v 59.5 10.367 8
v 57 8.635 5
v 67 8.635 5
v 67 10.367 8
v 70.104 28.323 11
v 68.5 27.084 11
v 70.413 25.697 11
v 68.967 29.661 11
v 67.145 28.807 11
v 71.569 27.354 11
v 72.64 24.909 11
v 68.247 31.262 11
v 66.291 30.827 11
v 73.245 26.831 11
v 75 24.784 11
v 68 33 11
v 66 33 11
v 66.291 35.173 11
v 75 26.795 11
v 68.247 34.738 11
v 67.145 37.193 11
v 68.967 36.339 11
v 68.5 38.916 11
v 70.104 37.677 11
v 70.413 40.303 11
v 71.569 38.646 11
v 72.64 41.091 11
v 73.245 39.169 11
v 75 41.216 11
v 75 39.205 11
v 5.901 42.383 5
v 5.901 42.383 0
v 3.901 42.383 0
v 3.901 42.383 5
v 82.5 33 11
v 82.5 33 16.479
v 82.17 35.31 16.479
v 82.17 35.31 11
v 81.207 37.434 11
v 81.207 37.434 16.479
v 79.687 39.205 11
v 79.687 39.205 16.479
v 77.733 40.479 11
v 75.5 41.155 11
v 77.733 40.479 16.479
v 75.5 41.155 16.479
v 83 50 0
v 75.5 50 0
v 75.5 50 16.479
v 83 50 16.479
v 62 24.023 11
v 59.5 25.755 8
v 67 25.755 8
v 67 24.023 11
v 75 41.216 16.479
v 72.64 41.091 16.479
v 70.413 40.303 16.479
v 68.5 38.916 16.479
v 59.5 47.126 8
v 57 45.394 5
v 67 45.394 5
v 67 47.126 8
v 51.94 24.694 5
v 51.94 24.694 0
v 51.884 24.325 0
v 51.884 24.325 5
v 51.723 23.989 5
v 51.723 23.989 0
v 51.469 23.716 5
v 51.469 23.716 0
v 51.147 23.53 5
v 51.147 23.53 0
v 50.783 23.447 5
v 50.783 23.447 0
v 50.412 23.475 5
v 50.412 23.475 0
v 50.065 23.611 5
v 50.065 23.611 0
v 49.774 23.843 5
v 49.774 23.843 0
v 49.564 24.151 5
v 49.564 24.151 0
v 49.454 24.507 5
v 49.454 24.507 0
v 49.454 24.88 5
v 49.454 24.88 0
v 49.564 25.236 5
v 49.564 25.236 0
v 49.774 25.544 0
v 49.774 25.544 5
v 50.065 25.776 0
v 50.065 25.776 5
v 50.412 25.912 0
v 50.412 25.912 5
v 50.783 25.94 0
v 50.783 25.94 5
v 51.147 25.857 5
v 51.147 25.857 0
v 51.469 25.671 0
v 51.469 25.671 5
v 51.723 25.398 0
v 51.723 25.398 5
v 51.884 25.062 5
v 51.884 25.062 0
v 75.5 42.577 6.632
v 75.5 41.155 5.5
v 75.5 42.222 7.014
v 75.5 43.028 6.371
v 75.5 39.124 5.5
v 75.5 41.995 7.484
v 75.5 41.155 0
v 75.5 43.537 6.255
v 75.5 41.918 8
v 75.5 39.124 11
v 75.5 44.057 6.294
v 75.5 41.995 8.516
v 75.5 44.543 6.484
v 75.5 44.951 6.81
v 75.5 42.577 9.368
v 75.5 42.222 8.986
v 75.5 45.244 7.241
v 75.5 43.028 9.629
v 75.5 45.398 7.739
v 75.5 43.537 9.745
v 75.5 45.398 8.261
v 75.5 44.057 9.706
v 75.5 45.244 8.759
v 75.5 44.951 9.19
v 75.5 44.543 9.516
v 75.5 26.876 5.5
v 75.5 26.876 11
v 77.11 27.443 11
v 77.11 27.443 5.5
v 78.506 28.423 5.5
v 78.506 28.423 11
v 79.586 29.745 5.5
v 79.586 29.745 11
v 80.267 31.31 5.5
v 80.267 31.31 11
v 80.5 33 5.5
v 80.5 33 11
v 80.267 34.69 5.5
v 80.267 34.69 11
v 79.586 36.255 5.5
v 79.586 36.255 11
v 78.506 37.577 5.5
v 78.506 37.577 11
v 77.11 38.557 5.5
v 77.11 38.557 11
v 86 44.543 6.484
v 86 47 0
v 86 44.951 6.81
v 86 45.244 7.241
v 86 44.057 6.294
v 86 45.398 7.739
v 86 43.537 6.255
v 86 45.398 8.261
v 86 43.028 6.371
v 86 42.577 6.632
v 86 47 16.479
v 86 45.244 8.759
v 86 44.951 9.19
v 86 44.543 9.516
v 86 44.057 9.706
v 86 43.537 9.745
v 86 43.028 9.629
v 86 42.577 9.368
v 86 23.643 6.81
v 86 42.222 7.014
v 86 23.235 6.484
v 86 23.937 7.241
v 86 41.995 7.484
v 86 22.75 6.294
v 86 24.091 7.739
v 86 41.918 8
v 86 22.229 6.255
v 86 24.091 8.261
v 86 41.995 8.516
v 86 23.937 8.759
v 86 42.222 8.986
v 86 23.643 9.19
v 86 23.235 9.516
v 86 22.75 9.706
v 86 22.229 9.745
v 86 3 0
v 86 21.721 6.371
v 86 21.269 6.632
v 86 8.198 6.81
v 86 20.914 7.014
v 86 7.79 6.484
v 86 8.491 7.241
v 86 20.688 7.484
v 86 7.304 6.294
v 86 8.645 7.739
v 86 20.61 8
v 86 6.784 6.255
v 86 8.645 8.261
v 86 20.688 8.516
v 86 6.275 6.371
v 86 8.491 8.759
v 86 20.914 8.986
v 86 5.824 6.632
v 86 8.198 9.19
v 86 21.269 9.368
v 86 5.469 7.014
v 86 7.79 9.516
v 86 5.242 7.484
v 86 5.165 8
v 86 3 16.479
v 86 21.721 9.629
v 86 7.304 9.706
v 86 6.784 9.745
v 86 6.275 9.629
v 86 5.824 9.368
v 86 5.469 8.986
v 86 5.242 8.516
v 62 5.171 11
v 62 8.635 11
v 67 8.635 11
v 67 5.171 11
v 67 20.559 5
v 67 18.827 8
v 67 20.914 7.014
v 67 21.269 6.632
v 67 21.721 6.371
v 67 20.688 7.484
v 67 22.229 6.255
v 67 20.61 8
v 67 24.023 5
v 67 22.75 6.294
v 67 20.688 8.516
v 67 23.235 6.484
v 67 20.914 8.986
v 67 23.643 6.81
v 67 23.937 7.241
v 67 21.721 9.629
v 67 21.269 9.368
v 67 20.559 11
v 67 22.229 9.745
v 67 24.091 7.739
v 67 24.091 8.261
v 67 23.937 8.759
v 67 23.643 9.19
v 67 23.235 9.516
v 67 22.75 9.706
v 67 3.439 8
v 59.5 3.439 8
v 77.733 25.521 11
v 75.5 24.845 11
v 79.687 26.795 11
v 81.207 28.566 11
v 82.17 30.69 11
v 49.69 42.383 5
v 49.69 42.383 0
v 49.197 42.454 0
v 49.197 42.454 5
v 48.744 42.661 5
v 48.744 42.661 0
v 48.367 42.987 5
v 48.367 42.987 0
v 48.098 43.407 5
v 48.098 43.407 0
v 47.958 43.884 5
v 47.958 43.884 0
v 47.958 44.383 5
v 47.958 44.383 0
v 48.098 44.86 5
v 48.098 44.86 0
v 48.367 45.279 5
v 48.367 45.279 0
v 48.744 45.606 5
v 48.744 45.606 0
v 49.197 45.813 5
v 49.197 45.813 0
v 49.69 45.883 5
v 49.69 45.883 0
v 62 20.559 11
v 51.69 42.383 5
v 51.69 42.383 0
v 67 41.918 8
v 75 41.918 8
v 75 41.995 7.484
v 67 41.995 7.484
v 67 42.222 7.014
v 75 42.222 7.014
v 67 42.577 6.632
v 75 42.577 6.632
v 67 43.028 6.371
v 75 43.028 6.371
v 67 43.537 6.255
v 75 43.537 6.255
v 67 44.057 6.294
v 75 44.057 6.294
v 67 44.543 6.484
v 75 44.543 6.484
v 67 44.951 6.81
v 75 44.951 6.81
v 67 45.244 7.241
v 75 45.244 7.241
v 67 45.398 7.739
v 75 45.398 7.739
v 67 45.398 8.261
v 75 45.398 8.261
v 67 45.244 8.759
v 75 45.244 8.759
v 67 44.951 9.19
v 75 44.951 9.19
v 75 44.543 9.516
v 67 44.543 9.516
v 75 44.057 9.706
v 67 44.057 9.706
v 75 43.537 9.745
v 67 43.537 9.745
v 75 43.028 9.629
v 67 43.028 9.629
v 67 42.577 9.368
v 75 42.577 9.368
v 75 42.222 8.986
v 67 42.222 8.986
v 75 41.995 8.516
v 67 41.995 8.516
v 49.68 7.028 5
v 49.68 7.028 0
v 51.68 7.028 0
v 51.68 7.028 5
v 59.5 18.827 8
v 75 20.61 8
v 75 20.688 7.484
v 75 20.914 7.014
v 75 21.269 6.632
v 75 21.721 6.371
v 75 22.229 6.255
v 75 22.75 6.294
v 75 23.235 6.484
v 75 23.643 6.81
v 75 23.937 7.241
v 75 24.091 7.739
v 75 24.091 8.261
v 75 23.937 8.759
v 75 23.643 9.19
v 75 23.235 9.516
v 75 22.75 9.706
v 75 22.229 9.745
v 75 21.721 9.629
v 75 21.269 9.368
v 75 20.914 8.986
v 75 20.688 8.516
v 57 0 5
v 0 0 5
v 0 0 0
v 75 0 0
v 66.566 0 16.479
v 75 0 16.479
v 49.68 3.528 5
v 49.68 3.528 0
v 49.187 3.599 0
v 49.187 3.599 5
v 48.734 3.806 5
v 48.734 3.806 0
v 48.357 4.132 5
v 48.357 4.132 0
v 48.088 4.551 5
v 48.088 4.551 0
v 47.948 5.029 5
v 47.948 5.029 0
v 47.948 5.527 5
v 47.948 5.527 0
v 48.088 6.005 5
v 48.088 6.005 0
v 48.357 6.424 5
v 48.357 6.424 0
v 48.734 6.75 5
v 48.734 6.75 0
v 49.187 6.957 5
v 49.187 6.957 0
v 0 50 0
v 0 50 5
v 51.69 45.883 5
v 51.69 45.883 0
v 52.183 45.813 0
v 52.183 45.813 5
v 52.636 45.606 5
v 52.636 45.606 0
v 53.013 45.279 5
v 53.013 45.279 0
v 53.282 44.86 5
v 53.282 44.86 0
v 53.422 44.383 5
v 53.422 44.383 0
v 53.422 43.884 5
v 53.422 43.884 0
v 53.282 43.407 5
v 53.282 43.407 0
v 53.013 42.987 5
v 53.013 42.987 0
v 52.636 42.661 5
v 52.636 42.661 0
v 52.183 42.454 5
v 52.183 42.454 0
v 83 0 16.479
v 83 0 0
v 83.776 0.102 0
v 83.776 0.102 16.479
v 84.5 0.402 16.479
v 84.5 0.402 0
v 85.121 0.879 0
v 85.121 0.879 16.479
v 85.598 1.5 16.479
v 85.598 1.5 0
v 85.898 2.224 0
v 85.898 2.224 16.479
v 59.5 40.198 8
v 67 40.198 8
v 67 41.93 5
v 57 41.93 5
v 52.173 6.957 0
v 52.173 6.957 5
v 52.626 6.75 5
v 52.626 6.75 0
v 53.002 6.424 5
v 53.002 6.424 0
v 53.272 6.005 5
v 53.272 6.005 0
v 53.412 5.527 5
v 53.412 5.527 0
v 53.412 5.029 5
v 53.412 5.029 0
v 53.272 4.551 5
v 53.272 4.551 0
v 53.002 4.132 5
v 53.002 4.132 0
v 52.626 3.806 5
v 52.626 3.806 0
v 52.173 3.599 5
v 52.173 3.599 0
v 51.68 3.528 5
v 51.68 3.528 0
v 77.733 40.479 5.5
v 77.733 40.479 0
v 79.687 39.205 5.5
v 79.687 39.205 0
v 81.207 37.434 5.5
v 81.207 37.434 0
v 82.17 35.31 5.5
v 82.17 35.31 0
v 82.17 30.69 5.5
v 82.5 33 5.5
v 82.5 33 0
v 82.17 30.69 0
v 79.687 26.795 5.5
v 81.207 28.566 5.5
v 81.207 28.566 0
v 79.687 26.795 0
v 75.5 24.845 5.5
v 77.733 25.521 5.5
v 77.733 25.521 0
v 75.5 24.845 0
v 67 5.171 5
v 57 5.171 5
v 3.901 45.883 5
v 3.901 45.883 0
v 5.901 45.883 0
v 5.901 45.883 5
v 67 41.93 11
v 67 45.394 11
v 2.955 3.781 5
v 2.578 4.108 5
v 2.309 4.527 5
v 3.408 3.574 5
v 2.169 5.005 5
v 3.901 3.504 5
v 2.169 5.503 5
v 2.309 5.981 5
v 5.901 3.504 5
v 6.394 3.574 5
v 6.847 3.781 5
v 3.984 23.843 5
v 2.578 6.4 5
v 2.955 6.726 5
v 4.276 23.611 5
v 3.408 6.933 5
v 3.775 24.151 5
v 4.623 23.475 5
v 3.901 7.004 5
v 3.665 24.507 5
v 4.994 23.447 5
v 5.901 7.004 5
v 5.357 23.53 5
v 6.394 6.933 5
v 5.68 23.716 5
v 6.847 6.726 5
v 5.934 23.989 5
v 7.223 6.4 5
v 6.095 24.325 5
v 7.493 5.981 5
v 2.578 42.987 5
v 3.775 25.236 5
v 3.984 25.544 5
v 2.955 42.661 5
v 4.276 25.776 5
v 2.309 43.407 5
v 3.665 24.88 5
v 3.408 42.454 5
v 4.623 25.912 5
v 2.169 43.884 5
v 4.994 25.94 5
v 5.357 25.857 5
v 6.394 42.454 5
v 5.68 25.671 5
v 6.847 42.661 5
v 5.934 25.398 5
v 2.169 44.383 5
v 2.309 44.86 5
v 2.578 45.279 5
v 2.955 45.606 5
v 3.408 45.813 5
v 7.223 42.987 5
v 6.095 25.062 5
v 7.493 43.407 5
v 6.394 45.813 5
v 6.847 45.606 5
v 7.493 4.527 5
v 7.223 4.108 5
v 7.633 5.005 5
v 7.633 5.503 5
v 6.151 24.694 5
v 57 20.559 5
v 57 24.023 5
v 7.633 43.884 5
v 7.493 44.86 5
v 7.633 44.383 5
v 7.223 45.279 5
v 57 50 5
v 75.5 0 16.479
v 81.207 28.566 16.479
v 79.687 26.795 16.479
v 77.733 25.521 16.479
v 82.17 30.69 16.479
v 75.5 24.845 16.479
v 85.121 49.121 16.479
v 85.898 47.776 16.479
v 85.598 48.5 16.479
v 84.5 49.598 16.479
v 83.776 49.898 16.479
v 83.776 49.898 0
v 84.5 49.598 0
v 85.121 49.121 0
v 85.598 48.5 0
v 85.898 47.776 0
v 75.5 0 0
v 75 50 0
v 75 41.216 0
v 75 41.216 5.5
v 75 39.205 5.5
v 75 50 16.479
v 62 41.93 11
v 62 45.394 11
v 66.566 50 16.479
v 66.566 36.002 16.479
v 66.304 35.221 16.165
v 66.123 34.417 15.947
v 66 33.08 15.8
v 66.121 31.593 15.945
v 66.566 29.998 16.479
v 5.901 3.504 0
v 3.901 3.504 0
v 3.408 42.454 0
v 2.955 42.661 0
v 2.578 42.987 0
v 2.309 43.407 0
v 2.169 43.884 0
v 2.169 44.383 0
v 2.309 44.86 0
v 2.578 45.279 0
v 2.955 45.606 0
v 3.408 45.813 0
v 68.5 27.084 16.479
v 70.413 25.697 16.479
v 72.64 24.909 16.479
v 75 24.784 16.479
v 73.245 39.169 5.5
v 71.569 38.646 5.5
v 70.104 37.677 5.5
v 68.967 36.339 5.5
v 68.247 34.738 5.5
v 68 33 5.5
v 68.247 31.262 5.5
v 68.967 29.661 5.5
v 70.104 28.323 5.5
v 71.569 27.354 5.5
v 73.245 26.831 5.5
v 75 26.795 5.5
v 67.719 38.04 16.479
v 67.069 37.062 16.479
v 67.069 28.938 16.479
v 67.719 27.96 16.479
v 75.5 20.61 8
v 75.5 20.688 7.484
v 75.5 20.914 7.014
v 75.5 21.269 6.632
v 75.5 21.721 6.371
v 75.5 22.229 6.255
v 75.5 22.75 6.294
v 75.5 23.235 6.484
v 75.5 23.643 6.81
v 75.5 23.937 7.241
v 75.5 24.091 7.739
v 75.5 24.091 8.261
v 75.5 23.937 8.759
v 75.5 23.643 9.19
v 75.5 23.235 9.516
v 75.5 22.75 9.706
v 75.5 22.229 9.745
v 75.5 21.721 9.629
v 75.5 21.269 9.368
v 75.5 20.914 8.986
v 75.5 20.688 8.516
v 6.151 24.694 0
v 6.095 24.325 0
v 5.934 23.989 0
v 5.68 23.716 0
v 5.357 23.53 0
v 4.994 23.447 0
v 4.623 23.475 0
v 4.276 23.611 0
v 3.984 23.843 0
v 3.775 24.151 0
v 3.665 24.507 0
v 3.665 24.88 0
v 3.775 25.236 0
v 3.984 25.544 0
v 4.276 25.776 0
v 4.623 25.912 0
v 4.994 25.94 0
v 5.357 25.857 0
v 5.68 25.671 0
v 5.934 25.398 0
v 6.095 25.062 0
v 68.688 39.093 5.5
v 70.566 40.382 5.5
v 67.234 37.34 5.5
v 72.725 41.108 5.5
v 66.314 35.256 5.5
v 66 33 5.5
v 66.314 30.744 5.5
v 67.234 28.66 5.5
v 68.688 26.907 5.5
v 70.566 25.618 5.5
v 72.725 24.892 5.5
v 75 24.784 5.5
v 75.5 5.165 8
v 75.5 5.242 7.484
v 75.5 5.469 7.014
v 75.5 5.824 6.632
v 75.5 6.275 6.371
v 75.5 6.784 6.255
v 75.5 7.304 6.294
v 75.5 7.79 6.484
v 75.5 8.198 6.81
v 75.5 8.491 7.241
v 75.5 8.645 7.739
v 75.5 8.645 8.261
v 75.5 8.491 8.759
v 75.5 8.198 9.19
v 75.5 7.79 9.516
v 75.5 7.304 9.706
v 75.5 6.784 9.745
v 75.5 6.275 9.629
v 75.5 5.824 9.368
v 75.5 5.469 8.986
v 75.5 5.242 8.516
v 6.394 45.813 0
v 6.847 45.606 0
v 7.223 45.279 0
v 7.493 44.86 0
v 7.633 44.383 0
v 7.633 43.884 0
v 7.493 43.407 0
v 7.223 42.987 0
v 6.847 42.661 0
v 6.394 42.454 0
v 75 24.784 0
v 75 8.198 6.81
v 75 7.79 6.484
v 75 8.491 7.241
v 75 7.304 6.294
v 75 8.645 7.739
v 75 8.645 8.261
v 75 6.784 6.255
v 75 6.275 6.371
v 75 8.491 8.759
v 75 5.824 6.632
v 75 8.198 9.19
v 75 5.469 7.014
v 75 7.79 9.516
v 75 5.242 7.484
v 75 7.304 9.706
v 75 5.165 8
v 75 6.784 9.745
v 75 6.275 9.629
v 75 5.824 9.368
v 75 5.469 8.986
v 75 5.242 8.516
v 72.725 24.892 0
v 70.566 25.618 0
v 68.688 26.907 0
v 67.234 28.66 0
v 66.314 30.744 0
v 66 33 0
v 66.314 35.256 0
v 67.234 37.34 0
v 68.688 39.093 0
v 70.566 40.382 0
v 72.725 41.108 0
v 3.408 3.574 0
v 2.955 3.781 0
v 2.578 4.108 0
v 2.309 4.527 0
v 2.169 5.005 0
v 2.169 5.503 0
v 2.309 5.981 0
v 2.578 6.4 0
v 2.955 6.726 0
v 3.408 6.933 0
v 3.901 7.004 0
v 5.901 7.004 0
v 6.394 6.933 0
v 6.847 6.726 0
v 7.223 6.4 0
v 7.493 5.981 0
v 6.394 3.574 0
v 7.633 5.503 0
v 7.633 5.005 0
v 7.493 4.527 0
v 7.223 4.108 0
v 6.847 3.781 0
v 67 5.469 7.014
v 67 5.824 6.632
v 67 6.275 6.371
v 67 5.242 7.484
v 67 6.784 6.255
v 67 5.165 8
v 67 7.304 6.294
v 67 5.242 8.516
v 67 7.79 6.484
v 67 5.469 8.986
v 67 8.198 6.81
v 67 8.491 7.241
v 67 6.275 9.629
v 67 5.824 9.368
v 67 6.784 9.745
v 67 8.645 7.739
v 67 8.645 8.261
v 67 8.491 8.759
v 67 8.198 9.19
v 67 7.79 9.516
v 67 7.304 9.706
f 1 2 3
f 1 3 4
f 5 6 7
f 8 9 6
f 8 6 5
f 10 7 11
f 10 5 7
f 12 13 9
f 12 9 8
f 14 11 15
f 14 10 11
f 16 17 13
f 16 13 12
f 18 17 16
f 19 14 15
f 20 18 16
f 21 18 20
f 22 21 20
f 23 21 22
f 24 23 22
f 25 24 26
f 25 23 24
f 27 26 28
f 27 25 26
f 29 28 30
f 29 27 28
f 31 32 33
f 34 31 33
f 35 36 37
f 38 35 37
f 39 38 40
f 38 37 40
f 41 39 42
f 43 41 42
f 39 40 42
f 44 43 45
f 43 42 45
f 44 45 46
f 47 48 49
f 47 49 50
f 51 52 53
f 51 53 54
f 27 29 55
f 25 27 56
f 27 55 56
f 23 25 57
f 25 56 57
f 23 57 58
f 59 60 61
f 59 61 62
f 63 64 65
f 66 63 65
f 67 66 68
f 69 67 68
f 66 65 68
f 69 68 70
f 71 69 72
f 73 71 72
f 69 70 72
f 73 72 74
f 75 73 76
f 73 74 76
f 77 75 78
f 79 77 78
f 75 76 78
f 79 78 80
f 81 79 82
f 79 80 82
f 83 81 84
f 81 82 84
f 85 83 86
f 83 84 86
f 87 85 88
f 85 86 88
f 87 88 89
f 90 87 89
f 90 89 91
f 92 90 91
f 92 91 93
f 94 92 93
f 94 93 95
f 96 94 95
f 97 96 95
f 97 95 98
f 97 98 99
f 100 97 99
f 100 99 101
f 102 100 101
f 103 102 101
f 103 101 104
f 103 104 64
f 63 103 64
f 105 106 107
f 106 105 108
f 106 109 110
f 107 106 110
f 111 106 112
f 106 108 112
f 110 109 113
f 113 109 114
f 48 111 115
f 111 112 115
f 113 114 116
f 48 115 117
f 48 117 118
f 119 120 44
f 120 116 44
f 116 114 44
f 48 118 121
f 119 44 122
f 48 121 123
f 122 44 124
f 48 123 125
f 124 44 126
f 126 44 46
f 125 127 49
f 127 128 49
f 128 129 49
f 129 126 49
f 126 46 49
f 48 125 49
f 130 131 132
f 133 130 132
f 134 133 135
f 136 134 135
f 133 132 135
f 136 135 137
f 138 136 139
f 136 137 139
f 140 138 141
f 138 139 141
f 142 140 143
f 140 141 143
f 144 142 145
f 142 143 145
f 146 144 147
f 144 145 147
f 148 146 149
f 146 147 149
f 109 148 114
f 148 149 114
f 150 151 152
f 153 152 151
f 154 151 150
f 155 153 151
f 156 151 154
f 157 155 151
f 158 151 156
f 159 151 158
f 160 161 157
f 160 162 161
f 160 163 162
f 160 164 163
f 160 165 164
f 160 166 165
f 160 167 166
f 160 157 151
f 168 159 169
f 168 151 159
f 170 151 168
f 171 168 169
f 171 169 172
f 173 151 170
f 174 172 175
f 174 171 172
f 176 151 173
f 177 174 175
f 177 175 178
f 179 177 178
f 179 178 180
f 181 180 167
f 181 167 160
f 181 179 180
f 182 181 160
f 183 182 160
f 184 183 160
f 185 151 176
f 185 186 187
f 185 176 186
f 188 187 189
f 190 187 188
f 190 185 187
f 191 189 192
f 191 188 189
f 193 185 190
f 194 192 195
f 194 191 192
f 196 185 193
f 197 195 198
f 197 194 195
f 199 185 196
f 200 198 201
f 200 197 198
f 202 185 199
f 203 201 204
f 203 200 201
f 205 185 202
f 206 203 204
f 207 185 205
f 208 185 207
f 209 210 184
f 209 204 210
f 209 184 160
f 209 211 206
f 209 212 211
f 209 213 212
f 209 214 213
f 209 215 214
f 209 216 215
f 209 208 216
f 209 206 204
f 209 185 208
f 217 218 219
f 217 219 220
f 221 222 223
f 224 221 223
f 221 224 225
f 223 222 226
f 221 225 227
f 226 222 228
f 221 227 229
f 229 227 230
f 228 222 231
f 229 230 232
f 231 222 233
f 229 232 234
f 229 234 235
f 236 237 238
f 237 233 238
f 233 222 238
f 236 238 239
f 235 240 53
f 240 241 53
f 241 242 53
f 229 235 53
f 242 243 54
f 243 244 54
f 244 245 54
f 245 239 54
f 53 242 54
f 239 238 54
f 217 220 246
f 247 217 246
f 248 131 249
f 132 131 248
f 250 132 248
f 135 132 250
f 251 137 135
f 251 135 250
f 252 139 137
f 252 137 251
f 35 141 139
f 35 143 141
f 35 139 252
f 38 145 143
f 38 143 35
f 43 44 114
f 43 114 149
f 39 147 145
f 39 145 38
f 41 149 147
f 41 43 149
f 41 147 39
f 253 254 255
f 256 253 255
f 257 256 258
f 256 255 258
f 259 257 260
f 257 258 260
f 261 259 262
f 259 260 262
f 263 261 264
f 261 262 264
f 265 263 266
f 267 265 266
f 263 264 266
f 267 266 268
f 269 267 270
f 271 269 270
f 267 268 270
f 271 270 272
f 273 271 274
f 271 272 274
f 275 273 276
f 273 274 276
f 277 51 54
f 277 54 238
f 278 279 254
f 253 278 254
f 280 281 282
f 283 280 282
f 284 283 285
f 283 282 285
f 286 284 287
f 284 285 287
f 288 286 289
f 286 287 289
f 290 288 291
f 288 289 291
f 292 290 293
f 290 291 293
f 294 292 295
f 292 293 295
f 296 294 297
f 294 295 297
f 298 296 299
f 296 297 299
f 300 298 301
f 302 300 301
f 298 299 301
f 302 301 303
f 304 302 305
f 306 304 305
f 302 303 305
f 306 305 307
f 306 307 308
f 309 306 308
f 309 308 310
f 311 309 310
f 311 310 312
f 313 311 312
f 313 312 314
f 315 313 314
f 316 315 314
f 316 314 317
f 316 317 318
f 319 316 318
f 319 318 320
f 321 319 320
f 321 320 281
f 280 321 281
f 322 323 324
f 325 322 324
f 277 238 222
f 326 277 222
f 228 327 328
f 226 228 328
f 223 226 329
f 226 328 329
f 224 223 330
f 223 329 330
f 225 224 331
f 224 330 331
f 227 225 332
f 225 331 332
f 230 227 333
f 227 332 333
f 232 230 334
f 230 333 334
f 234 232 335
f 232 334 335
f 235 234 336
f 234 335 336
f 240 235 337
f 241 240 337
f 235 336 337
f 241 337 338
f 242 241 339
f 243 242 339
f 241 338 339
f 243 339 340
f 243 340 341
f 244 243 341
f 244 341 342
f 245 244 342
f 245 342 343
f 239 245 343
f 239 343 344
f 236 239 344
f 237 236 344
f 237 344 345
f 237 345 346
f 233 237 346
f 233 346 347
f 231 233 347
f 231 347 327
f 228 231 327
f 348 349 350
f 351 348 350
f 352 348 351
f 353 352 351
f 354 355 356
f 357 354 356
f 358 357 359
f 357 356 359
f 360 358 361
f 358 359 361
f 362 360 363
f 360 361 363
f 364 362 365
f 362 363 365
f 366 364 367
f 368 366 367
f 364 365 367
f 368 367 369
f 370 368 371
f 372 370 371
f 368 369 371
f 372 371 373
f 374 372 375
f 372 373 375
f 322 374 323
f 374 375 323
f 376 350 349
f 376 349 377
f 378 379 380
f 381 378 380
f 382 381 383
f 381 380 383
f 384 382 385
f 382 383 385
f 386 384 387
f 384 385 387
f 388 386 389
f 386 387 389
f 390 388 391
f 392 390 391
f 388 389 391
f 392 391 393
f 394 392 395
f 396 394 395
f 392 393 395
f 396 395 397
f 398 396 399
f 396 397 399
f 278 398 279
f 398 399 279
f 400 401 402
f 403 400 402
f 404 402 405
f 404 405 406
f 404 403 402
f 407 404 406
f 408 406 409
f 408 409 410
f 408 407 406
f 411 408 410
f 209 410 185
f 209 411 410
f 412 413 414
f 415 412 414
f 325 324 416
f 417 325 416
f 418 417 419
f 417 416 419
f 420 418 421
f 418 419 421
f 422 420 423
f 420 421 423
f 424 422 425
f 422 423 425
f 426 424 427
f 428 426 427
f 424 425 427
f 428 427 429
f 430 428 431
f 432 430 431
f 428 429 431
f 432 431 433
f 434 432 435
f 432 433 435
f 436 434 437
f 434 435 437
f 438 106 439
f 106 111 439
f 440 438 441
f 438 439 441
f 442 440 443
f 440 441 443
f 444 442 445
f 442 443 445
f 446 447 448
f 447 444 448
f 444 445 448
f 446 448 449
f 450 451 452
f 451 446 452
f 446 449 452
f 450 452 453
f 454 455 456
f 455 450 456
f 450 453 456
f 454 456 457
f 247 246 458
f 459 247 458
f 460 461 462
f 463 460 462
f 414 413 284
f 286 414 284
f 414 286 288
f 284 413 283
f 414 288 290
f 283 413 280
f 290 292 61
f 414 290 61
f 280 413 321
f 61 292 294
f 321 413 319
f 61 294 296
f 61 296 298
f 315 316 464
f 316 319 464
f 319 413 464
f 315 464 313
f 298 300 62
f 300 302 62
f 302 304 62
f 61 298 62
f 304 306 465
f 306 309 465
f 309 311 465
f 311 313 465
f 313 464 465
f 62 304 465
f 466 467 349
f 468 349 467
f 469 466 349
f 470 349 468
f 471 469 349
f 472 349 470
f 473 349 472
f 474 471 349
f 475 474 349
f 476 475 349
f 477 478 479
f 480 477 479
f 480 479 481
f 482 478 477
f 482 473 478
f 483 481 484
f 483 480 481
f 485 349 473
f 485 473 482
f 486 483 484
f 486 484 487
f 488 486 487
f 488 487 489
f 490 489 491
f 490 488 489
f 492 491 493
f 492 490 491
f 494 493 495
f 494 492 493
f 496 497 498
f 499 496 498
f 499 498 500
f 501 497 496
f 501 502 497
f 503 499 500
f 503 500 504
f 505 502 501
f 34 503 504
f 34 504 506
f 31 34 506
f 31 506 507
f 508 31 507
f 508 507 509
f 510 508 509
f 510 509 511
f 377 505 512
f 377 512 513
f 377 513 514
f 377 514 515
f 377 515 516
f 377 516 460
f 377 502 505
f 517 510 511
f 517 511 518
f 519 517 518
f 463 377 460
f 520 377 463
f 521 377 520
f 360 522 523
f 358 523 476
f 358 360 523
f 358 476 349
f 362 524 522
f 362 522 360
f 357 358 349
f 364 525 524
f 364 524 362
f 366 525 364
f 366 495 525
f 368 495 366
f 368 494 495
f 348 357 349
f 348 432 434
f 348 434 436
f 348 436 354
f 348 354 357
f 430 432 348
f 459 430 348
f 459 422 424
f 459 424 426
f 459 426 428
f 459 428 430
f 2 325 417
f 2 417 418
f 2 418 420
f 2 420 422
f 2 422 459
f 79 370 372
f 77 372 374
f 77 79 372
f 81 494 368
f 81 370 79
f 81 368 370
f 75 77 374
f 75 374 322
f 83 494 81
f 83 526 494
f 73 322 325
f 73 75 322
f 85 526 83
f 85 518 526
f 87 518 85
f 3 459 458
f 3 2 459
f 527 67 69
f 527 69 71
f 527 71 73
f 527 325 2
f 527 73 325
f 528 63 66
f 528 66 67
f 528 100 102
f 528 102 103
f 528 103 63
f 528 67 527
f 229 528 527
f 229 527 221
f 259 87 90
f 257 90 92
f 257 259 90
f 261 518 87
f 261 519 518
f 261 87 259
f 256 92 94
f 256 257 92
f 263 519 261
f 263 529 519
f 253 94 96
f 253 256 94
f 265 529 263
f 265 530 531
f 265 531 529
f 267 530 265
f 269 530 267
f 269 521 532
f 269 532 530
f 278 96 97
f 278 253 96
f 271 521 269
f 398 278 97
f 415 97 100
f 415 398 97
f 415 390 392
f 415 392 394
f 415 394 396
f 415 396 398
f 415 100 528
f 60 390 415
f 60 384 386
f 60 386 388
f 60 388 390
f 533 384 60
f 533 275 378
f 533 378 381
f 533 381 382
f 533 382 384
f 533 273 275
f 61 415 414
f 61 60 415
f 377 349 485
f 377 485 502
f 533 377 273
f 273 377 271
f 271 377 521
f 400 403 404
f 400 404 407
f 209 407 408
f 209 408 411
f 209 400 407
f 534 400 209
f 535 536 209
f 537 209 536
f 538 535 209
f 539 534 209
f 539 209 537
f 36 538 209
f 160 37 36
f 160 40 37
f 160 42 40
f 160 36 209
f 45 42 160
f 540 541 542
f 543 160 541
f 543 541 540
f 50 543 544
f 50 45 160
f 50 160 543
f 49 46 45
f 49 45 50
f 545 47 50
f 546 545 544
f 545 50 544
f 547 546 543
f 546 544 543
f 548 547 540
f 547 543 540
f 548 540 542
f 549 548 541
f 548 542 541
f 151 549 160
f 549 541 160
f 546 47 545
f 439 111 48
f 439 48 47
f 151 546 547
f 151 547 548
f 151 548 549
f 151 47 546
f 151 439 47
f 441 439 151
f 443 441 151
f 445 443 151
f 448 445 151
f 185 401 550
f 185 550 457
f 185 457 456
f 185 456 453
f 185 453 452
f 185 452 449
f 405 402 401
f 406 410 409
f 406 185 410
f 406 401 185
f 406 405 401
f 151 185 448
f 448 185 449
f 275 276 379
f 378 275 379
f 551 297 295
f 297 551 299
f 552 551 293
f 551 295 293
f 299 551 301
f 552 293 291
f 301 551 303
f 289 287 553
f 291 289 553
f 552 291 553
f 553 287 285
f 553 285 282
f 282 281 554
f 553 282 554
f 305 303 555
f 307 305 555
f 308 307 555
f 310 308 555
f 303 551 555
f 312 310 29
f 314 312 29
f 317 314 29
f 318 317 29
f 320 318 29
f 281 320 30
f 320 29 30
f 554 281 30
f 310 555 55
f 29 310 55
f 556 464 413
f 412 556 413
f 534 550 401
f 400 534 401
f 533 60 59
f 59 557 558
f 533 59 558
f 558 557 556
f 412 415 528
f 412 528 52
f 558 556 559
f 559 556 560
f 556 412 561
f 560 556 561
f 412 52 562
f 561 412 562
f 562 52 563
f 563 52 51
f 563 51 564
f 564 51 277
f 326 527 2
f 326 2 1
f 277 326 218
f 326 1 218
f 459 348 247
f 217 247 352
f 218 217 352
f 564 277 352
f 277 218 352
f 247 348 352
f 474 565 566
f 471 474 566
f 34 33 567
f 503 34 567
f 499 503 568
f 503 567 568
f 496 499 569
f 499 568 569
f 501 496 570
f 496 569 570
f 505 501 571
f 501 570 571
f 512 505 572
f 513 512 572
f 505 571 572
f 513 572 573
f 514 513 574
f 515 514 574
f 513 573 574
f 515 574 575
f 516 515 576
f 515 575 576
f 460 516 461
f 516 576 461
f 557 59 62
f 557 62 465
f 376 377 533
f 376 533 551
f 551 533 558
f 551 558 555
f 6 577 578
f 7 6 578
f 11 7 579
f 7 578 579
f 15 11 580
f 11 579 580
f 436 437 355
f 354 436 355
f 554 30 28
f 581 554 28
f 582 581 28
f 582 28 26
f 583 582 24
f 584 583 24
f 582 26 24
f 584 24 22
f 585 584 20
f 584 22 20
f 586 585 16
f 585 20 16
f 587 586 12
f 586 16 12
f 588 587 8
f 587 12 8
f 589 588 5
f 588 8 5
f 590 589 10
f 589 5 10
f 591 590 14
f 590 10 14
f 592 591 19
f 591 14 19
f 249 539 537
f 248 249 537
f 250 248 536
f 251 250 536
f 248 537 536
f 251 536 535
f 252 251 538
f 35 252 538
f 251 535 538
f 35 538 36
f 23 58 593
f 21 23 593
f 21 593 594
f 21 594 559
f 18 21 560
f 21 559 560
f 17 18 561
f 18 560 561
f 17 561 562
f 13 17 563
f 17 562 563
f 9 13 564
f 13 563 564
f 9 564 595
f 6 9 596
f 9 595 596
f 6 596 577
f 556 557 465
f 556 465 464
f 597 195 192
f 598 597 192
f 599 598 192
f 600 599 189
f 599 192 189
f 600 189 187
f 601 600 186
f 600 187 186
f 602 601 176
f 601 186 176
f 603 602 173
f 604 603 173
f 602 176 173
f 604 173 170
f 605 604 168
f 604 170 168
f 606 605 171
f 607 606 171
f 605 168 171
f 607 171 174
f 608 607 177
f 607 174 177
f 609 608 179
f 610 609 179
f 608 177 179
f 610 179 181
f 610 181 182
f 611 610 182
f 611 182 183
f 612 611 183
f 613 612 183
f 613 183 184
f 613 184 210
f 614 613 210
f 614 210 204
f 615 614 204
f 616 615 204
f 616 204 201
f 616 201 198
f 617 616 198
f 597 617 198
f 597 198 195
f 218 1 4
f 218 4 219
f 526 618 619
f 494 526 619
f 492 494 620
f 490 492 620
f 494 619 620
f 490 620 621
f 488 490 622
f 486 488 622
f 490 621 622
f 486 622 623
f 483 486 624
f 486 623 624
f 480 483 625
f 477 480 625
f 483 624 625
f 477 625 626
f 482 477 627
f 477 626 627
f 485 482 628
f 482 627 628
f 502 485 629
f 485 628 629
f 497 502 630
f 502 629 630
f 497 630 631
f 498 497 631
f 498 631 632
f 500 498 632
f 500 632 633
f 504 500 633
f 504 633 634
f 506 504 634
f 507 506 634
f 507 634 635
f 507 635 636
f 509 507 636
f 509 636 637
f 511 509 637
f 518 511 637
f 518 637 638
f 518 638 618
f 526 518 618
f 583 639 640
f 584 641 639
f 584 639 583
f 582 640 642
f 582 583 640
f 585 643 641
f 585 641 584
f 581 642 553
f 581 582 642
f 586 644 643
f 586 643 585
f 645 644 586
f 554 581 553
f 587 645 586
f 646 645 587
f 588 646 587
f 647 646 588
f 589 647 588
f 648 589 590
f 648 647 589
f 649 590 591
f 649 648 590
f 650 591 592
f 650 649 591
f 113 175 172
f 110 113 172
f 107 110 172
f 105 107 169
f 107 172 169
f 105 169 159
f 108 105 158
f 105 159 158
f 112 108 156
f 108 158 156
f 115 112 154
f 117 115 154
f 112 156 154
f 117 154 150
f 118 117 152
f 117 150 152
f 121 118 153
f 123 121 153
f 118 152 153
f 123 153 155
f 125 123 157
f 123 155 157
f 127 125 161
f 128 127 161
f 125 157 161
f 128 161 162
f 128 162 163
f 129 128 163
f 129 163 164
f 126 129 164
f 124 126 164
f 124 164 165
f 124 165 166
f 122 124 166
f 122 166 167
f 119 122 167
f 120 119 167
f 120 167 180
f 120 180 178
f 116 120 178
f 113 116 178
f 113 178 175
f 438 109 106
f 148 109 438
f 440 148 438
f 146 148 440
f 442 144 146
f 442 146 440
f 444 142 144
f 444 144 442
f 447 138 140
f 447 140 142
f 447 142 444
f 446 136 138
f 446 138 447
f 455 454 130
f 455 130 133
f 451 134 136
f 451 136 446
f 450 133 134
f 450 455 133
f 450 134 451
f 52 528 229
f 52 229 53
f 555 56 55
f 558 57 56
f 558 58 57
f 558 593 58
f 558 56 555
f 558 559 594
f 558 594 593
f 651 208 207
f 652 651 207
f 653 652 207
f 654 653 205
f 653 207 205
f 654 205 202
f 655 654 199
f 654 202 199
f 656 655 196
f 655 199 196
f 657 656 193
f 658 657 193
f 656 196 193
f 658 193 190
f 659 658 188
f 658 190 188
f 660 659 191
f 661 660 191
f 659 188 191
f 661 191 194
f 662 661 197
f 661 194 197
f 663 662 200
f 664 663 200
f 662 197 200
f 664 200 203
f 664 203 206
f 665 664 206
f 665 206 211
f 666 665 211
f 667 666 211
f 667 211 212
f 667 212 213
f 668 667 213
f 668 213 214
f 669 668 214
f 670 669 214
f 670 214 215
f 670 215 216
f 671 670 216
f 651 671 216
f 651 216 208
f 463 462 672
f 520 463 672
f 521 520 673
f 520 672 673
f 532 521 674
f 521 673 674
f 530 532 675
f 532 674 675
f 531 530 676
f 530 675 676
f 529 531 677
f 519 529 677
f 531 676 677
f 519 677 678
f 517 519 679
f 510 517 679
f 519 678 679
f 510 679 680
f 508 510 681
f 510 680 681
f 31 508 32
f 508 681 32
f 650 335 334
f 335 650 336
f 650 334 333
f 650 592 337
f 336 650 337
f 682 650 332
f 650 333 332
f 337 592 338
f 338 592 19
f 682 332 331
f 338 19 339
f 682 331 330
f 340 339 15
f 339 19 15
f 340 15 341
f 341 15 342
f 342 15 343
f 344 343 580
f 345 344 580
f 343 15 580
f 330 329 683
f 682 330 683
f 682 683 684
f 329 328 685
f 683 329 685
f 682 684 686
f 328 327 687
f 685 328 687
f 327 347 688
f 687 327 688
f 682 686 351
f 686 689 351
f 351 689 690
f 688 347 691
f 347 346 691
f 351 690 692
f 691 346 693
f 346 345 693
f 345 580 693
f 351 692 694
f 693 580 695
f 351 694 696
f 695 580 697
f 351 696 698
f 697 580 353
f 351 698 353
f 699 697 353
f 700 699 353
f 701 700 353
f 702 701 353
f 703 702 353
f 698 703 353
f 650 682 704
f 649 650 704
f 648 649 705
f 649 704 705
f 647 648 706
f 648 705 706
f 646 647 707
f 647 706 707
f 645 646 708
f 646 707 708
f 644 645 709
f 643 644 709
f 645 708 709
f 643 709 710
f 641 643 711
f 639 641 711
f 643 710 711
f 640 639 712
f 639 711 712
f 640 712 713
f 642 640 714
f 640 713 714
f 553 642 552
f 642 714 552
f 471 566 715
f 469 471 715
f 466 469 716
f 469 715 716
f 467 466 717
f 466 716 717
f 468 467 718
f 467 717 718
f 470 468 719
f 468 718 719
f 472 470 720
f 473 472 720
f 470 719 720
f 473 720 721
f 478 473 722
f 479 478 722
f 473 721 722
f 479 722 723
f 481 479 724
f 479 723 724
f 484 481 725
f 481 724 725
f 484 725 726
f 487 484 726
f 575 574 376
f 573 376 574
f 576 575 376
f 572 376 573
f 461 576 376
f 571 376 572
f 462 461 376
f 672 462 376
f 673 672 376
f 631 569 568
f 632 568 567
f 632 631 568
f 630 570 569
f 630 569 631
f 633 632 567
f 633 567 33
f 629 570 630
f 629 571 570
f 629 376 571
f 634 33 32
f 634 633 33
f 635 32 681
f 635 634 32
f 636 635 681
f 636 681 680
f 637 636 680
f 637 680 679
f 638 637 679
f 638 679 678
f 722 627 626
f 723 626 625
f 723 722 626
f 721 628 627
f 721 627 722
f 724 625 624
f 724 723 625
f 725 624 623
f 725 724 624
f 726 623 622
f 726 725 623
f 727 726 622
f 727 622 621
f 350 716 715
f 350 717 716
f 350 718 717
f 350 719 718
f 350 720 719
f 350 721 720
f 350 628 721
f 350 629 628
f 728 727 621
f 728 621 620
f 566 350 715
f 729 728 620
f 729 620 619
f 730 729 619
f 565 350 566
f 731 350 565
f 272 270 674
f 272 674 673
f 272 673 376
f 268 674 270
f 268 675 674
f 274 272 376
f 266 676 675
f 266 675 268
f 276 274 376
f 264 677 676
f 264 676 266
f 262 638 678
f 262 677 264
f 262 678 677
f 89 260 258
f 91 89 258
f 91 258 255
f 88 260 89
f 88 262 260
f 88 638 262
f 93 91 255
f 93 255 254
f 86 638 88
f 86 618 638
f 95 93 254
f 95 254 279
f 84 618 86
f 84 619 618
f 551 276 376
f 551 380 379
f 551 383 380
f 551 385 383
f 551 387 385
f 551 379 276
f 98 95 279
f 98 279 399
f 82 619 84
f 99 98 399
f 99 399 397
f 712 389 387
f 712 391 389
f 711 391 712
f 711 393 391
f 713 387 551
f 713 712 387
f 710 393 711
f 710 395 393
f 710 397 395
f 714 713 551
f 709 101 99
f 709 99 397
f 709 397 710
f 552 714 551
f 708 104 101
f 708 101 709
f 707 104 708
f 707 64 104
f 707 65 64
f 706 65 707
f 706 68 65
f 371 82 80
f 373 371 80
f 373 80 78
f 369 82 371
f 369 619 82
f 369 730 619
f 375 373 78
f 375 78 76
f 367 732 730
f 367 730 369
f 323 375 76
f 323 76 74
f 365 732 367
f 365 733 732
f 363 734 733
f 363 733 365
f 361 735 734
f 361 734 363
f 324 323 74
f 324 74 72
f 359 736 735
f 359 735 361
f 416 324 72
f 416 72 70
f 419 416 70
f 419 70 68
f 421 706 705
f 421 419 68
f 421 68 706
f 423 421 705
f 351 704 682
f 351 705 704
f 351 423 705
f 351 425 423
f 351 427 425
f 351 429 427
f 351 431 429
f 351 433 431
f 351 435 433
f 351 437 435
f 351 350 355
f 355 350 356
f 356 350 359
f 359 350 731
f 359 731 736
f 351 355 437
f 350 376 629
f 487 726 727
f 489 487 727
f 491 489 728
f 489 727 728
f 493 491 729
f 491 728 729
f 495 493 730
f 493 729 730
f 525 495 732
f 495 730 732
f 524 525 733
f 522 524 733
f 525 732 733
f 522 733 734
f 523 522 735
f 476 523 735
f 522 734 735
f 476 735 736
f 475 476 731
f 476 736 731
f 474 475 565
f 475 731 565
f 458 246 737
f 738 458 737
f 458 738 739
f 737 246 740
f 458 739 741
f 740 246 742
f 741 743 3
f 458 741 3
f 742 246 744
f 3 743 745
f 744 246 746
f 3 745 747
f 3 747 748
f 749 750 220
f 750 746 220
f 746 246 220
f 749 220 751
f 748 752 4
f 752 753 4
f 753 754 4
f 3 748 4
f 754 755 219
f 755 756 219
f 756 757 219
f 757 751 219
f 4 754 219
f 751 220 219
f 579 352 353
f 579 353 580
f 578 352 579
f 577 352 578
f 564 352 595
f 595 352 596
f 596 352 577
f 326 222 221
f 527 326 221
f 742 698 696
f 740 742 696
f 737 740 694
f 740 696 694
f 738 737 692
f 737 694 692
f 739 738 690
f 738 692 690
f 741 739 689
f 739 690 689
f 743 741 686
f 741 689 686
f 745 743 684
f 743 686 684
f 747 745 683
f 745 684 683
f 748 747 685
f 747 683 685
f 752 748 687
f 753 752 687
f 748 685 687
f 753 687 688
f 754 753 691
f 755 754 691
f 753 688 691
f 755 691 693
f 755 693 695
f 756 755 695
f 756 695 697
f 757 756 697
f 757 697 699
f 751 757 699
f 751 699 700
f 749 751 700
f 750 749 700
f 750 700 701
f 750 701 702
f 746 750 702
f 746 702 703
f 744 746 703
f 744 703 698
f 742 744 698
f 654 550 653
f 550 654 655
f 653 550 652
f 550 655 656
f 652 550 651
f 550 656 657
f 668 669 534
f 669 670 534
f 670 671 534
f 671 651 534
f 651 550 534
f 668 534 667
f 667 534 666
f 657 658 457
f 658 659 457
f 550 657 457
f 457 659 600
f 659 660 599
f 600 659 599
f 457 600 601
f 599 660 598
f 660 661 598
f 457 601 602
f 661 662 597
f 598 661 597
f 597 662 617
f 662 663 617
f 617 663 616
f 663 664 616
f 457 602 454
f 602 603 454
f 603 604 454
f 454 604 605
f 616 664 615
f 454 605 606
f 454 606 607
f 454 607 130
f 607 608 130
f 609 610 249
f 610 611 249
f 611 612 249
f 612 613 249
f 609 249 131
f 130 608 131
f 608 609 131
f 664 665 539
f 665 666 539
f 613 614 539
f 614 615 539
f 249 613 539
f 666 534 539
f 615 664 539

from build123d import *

# Parameters (mm, degrees)
F0_W      = 80
F0_H      = 50
F1_DEPTH  = 5
F2_W      = 23
F2_H      = 50
F3_DEPTH  = 15
F5_DEPTH  = 50
F7_DEPTH  = 25
F4_W      = 6
F4_H      = 20
F8_DEPTH  = 50
F9_R      = 1.25
F10_DEPTH = 9
F11_R     = 6.25
F11_R_2   = 1.25
F12_DEPTH = 6
F13_R     = 8.25
F13_R_2   = 1.25
F14_DEPTH = 5.5
F16_DEPTH = 25
F17_R     = 3
F19_DEPTH = 55
F21_DEPTH = 30
F24_R     = 1.25
F25_DEPTH = 10
F26_DEPTH = 10
F28_DEPTH = 30


with BuildPart() as f1:
    # F0 (on Top) → F1 (new body)
    with BuildSketch(Plane.XY):
        with Locations((40, 25)):
            Rectangle(F0_W, F0_H)
        with BuildLine():
            ThreePointArc((5.9007617161, 7.0035592838), (7.6507617161, 5.2535592838), (5.9007617161, 3.5035592838))
            Line((5.9007617161, 3.5035592838), (3.9007617161, 3.5035592838))
            ThreePointArc((3.9007617161, 3.5035592838), (2.1507617161, 5.2535592838), (3.9007617161, 7.0035592838))
            Line((3.9007617161, 7.0035592838), (5.9007617161, 7.0035592838))
        make_face(mode=Mode.SUBTRACT)
        with BuildLine():
            ThreePointArc((51.6797859669, 7.0277387462), (53.4297859669, 5.2777387462), (51.6797859669, 3.5277387462))
            Line((51.6797859669, 3.5277387462), (49.6797859669, 3.5277387462))
            ThreePointArc((49.6797859669, 3.5277387462), (47.9297859669, 5.2777387462), (49.6797859669, 7.0277387462))
            Line((49.6797859669, 7.0277387462), (51.6797859669, 7.0277387462))
        make_face(mode=Mode.SUBTRACT)
        with BuildLine():
            ThreePointArc((5.9007617161, 45.8834791875), (7.6507617161, 44.1334791875), (5.9007617161, 42.3834791875))
            Line((5.9007617161, 42.3834791875), (3.9007617161, 42.3834791875))
            ThreePointArc((3.9007617161, 42.3834791875), (2.1507617161, 44.1334791875), (3.9007617161, 45.8834791875))
            Line((3.9007617161, 45.8834791875), (5.9007617161, 45.8834791875))
        make_face(mode=Mode.SUBTRACT)
        with BuildLine():
            ThreePointArc((51.6899411082, 45.8834791875), (53.4399411082, 44.1334791875), (51.6899411082, 42.3834791875))
            Line((51.6899411082, 42.3834791875), (49.6899411082, 42.3834791875))
            ThreePointArc((49.6899411082, 42.3834791875), (47.9399411082, 44.1334791875), (49.6899411082, 45.8834791875))
            Line((49.6899411082, 45.8834791875), (51.6899411082, 45.8834791875))
        make_face(mode=Mode.SUBTRACT)
    extrude(amount=F1_DEPTH)

    # F2 (on face) → F3 (join)
    with BuildSketch(Plane.XY.offset(5)):
        with Locations((68.5, 25)):
            Rectangle(F2_W, F2_H)
    extrude(amount=F3_DEPTH)

    # F4 (on face) → F5 (cut)
    with BuildSketch(Plane.XZ):
        Polygon((57, 5), (68.5, 20), (57, 20), align=None)
    extrude(amount=-F5_DEPTH, mode=Mode.SUBTRACT)

    # F6 (on face) → F7 (cut)
    with BuildSketch(Plane.XY.offset(20)):
        with BuildLine():
            Line((74.25, 31.75), (74.25, 34.25))
            ThreePointArc((74.25, 34.25), (73, 33), (74.25, 31.75))
        make_face()
        with BuildLine():
            ThreePointArc((75.5, 33), (75.1338834765, 33.8838834765), (74.25, 34.25))
            Line((74.25, 34.25), (74.25, 31.75))
            ThreePointArc((74.25, 31.75), (75.1338834765, 32.1161165235), (75.5, 33))
        make_face()
    extrude(amount=-F7_DEPTH, mode=Mode.SUBTRACT)

    # F4 (on face) → F8 (join)
    with BuildSketch(Plane.XZ):
        with Locations((83, 10)):
            Rectangle(F4_W, F4_H)
    extrude(amount=-F8_DEPTH)

    # F9 (on face) → F10 (cut)
    with BuildSketch(Plane.XY.offset(20)):
        with BuildLine():
            Line((68.5, 27.0839202169), (68.5, 38.9160797831))
            ThreePointArc((68.5, 38.9160797831), (66, 33), (68.5, 27.0839202169))
        make_face()
        with BuildLine():
            ThreePointArc((68.5, 27.0839202169), (77.4613081447, 25.4006579232), (82.5, 33))
            ThreePointArc((82.5, 33), (77.4613081447, 40.5993420768), (68.5, 38.9160797831))
            Line((68.5, 38.9160797831), (68.5, 27.0839202169))
        make_face()
        with Locations((74.25, 33)):
            Circle(F9_R, mode=Mode.SUBTRACT)
    extrude(amount=-F10_DEPTH, mode=Mode.SUBTRACT)

    # F11 (on face) → F12 (cut)
    with BuildSketch(Plane.XY.offset(11)):
        with Locations((74.25, 33)):
            Circle(F11_R)
        with Locations((74.25, 33)):
            Circle(F11_R_2, mode=Mode.SUBTRACT)
    extrude(amount=-F12_DEPTH, mode=Mode.SUBTRACT)

    # F13 (on face) → F14 (cut)
    with BuildSketch(Plane(origin=(0, 0, 0), x_dir=(1, 0, 0), z_dir=(0, 0, -1))):
        with Locations((74.25, -33)):
            Circle(F13_R)
        with Locations((74.25, -33)):
            Circle(F13_R_2, mode=Mode.SUBTRACT)
    extrude(amount=-F14_DEPTH, mode=Mode.SUBTRACT)

    # F15 (on face) → F16 (cut)
    with BuildSketch(Plane.XY.offset(20)):
        with BuildLine():
            Line((75.5, 41.1547532152), (75.5, 50))
            Line((75.5, 50), (75, 50))
            Line((75, 50), (75, 41.2158383626))
            ThreePointArc((75, 41.2158383626), (75.2504663157, 41.1891127206), (75.5, 41.1547532152))
        make_face()
        with BuildLine():
            Line((75.5, 24.8452467848), (75.5, 41.1547532152))
            ThreePointArc((75.5, 41.1547532152), (75.2504663157, 41.1891127206), (75, 41.2158383626))
            Line((75, 41.2158383626), (75, 24.7841616374))
            ThreePointArc((75, 24.7841616374), (75.2504663157, 24.8108872794), (75.5, 24.8452467848))
        make_face()
        with BuildLine():
            Line((75.5, 0), (75.5, 24.8452467848))
            ThreePointArc((75.5, 24.8452467848), (75.2504663157, 24.8108872794), (75, 24.7841616374))
            Line((75, 24.7841616374), (75, 0))
            Line((75, 0), (75.5, 0))
        make_face()
    extrude(amount=-F16_DEPTH, mode=Mode.SUBTRACT)

    # F17
    f17_edges = [f1.edges().sort_by_distance(p)[0] for p in [
        (86, 0, 10),
        (86, 50, 10),
    ]]
    fillet(f17_edges, radius=F17_R)

    # F18 (on face) → F19 (cut)
    with BuildSketch(Plane.XZ):
        Polygon((57, 5), (69.5, 20), (68.5, 20), align=None)
    extrude(amount=-F19_DEPTH, mode=Mode.SUBTRACT)

    # F20 (on face) → F21 (cut)
    with BuildSketch(Plane.YZ.offset(86)):
        with BuildLine():
            Line((5.1647031754, 8), (8.6647031754, 8))
            ThreePointArc((8.6647031754, 8), (6.9147031754, 9.75), (5.1647031754, 8))
        make_face()
        with BuildLine():
            ThreePointArc((5.1647031754, 8), (6.9147031754, 6.25), (8.6647031754, 8))
            Line((8.6647031754, 8), (5.1647031754, 8))
        make_face()
        with BuildLine():
            ThreePointArc((24.1101590842, 8), (22.3601590842, 9.75), (20.6101590842, 8))
            Line((20.6101590842, 8), (24.1101590842, 8))
        make_face()
        with BuildLine():
            Line((24.1101590842, 8), (20.6101590842, 8))
            ThreePointArc((20.6101590842, 8), (22.3601590842, 6.25), (24.1101590842, 8))
        make_face()
        with BuildLine():
            ThreePointArc((45.4176815152, 8), (43.6676815152, 9.75), (41.9176815152, 8))
            Line((41.9176815152, 8), (45.4176815152, 8))
        make_face()
        with BuildLine():
            Line((45.4176815152, 8), (41.9176815152, 8))
            ThreePointArc((41.9176815152, 8), (43.6676815152, 6.25), (45.4176815152, 8))
        make_face()
    extrude(amount=-F21_DEPTH, mode=Mode.SUBTRACT)

    # F24 (on face) → F25 (cut)
    with BuildSketch(Plane(origin=(0, 0, 0), x_dir=(1, 0, 0), z_dir=(0, 0, -1))):
        with Locations((4.9007617161, -24.6935192357)):
            Circle(F24_R)
        with Locations((50.6899411082, -24.6935192357)):
            Circle(F24_R)
    extrude(amount=-F25_DEPTH, mode=Mode.SUBTRACT)

    # F23 (on offset) → F26 (cut)
    with BuildSketch(Plane.YZ.offset(57)):
        Polygon((45.3940773321, 11), (41.929975717, 11), (40.1979249094, 8), (41.929975717, 5), (45.3940773321, 5), (47.1261281397, 8), align=None)
        Polygon((24.0227835191, 11), (20.558681904, 11), (18.8266310964, 8), (20.558681904, 5), (24.0227835191, 5), (25.7548343267, 8), align=None)
        Polygon((8.6352921961, 11), (5.1711905809, 11), (3.4391397734, 8), (5.1711905809, 5), (8.6352921961, 5), (10.3673430036, 8), align=None)
    extrude(amount=F26_DEPTH, mode=Mode.SUBTRACT)

    # F27 (on offset) → F28 (cut)
    with BuildSketch(Plane.YZ.offset(57)):
        Polygon((50.410144031, 16.4787229151), (50.410144031, 19.4787229151), (50.410144031, 20.4787229151), (-0.8298081812, 20.4787229151), (-0.8298081812, 16.4787229151), align=None)
    extrude(amount=F28_DEPTH, mode=Mode.SUBTRACT)


solid = f1.part
